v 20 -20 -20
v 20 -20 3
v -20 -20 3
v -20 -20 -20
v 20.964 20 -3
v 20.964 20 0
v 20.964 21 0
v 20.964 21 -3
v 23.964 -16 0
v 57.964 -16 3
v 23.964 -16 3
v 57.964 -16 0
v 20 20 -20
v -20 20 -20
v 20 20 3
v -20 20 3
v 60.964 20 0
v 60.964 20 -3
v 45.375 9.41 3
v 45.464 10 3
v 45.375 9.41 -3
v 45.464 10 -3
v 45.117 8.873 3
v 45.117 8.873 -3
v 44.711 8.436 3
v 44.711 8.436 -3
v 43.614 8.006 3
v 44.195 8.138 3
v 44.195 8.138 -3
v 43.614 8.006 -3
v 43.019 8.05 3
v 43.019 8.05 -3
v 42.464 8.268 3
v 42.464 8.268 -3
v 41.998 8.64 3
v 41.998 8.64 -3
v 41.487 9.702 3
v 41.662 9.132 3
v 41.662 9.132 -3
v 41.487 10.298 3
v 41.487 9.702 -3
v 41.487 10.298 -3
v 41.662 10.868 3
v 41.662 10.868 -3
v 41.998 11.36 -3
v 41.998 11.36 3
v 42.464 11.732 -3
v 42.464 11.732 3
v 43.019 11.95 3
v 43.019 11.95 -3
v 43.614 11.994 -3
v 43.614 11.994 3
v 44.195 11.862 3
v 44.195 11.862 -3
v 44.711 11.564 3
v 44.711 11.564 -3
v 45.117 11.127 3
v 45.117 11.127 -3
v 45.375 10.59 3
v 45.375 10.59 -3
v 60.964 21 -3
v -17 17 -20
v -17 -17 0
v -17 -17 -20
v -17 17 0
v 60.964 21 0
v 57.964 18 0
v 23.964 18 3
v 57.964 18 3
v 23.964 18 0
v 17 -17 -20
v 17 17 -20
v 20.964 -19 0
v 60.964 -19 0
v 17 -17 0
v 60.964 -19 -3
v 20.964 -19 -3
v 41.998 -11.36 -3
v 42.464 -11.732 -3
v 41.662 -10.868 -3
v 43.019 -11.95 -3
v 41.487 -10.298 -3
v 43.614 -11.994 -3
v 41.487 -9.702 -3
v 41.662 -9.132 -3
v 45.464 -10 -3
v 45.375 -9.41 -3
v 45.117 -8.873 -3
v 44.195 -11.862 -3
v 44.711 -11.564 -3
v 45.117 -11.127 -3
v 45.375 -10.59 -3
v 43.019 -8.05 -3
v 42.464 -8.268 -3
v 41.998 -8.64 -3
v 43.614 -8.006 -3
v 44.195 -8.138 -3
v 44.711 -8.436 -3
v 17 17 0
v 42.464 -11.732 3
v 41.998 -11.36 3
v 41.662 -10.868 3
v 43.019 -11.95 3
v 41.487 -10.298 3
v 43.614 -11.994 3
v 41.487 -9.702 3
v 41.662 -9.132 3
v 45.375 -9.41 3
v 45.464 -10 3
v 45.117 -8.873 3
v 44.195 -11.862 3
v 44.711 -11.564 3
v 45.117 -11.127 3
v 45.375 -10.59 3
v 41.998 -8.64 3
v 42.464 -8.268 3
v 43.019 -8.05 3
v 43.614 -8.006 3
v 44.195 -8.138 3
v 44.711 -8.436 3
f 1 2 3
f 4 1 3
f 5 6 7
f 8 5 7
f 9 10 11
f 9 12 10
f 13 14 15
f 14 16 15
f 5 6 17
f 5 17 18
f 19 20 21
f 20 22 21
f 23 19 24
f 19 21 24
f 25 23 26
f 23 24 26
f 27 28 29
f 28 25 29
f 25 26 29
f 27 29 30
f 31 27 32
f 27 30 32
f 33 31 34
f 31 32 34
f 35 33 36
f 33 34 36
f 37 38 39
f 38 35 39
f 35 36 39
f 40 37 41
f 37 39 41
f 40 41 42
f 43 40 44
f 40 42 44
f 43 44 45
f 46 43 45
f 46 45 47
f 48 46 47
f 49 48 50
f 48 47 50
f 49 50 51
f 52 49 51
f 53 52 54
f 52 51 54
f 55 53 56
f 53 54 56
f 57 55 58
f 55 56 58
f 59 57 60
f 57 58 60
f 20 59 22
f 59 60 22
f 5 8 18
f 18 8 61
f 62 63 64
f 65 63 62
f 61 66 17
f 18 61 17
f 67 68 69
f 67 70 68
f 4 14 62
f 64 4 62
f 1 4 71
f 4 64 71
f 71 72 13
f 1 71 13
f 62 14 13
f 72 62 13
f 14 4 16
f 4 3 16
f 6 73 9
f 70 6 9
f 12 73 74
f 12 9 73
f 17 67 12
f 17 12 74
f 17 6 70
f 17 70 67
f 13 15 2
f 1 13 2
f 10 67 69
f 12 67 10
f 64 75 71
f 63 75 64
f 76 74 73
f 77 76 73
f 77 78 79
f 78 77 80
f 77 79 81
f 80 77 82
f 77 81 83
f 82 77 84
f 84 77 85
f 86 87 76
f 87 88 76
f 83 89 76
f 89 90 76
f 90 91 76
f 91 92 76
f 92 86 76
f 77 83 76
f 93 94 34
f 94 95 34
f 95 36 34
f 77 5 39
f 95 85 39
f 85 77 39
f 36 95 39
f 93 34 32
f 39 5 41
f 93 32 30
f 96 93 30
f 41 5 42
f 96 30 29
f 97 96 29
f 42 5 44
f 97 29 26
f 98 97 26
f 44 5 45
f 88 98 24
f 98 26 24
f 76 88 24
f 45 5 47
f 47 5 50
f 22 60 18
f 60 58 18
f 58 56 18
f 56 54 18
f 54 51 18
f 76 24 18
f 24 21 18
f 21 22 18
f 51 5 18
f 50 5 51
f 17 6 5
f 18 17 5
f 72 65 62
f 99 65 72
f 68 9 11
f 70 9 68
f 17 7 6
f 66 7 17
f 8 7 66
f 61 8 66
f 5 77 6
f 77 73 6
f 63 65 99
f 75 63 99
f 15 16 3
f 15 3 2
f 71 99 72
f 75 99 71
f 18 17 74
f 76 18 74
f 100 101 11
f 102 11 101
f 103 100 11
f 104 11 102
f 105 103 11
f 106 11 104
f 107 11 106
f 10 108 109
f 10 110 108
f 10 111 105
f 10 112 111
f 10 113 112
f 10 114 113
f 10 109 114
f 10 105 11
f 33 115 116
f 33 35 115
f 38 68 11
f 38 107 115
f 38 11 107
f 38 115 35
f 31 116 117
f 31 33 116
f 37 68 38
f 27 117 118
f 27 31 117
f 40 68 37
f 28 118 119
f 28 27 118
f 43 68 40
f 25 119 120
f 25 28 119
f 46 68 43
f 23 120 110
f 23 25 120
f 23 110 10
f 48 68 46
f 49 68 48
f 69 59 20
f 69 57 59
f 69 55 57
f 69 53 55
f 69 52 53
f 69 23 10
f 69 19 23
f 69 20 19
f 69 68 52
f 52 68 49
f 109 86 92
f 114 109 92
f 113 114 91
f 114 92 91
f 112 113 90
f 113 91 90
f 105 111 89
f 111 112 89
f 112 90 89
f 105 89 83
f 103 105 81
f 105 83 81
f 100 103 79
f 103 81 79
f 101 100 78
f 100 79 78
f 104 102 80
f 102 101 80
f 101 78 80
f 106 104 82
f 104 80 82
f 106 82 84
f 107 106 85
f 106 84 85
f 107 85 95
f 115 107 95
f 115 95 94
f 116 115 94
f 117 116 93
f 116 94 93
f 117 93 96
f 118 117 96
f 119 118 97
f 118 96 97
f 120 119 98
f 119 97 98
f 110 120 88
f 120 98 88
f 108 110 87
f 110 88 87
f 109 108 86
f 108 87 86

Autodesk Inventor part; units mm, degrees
ref_plane "YZ Plane" through (0, 0, 0) normal (1, 0, 0) x (0, 1, 0)
ref_plane "XZ Plane" through (0, 0, 0) normal (0, 1, 0) x (-1, 0, 0)
ref_plane "XY Plane" through (0, 0, 0) normal (0, 0, 1) x (1, 0, 0)
sketch "Sketch1" plane through (0, 0, 0) normal (0, 0, 1) x (1, 0, 0)
  line L0 (-20, 20) -> (20, 20)
  line L1 (20, 20) -> (20, -20)
  line L2 (20, -20) -> (-20, -20)
  line L3 (-20, -20) -> (-20, 20)
  line L4 (-20, 20) -> (20, -20) construction
  line L5 (20, 20) -> (-20, -20) construction
  line L6 (-17, 17) -> (17, 17)
  line L7 (17, 17) -> (17, -17)
  line L8 (17, -17) -> (-17, -17)
  line L9 (-17, -17) -> (-17, 17)
  line L10 (-17, 17) -> (17, -17) construction
  line L11 (17, 17) -> (-17, -17) construction
  line L12 (20.9643, 21) -> (60.9643, 21)
  line L13 (60.9643, 21) -> (60.9643, -19)
  line L14 (60.9643, -19) -> (20.9643, -19)
  line L15 (20.9643, -19) -> (20.9643, 21)
  line L16 (20.9643, 21) -> (60.9643, -19) construction
  line L17 (60.9643, 21) -> (20.9643, -19) construction
  line L18 (23.9643, 18) -> (57.9643, 18)
  line L19 (57.9643, 18) -> (57.9643, -16)
  line L20 (57.9643, -16) -> (23.9643, -16)
  line L21 (23.9643, -16) -> (23.9643, 18)
  line L22 (23.9643, 18) -> (57.9643, -16) construction
  line L23 (57.9643, 18) -> (23.9643, -16) construction
  line L24 (60.9643, 0) -> (43.4643, 0) construction
  line L25 (43.4643, 0) -> (43.4643, -10) construction
  line L26 (43.4643, 0) -> (43.4643, 10) construction
  circle A0 centre (43.4643, -10) radius 2
  circle A1 centre (43.4643, 10) radius 2
  point P0 (0, 0)
  point P1 (40.9643, 1)
  dimension "d0" = 40
  dimension "d1" = 40
  dimension "d2" = 34
  dimension "d3" = 34
  dimension "d4" = 40
  dimension "d5" = 40
  dimension "d6" = 34
  dimension "d7" = 34
  dimension "d20" = 17.5
  dimension "d21" = 10
  dimension "d22" = 10
  dimension "d23" = 4
  dimension "d24" = 4
extrude "Extrusion7" add sketch "Sketch1" along normal blind 3 contours L0 L1 L2 L3 | L6 L7 L8 L9
extrude "Extrusion8" add sketch "Sketch1" against normal blind 20 contours L0 L1 L2 L3
extrude "Extrusion9" add sketch "Sketch1" along normal blind 3 contours L18 L19 L20 L21
extrude "Extrusion10" add sketch "Sketch1" against normal blind 3 contours L12 L13 L14 L15 | L18 L19 L20 L21
sketch "Sketch2" plane through (20, -20, 3) normal (1, 0, 0) x (0, 0, -1)
  line L0 (23, 0) -> (0, 0)
  line L1 (0, 0) -> (0, 40)
  line L2 (0, 40) -> (23, 40)
  line L3 (23, 40) -> (23, 0)
  point P0 (3, 20)
split body "Split1" sketch "Sketch2" result two bodies curves L3 L0 L1 L2 first body at (34.2976, 20.5, -1)
properties part number "Camera_Display_Box"
